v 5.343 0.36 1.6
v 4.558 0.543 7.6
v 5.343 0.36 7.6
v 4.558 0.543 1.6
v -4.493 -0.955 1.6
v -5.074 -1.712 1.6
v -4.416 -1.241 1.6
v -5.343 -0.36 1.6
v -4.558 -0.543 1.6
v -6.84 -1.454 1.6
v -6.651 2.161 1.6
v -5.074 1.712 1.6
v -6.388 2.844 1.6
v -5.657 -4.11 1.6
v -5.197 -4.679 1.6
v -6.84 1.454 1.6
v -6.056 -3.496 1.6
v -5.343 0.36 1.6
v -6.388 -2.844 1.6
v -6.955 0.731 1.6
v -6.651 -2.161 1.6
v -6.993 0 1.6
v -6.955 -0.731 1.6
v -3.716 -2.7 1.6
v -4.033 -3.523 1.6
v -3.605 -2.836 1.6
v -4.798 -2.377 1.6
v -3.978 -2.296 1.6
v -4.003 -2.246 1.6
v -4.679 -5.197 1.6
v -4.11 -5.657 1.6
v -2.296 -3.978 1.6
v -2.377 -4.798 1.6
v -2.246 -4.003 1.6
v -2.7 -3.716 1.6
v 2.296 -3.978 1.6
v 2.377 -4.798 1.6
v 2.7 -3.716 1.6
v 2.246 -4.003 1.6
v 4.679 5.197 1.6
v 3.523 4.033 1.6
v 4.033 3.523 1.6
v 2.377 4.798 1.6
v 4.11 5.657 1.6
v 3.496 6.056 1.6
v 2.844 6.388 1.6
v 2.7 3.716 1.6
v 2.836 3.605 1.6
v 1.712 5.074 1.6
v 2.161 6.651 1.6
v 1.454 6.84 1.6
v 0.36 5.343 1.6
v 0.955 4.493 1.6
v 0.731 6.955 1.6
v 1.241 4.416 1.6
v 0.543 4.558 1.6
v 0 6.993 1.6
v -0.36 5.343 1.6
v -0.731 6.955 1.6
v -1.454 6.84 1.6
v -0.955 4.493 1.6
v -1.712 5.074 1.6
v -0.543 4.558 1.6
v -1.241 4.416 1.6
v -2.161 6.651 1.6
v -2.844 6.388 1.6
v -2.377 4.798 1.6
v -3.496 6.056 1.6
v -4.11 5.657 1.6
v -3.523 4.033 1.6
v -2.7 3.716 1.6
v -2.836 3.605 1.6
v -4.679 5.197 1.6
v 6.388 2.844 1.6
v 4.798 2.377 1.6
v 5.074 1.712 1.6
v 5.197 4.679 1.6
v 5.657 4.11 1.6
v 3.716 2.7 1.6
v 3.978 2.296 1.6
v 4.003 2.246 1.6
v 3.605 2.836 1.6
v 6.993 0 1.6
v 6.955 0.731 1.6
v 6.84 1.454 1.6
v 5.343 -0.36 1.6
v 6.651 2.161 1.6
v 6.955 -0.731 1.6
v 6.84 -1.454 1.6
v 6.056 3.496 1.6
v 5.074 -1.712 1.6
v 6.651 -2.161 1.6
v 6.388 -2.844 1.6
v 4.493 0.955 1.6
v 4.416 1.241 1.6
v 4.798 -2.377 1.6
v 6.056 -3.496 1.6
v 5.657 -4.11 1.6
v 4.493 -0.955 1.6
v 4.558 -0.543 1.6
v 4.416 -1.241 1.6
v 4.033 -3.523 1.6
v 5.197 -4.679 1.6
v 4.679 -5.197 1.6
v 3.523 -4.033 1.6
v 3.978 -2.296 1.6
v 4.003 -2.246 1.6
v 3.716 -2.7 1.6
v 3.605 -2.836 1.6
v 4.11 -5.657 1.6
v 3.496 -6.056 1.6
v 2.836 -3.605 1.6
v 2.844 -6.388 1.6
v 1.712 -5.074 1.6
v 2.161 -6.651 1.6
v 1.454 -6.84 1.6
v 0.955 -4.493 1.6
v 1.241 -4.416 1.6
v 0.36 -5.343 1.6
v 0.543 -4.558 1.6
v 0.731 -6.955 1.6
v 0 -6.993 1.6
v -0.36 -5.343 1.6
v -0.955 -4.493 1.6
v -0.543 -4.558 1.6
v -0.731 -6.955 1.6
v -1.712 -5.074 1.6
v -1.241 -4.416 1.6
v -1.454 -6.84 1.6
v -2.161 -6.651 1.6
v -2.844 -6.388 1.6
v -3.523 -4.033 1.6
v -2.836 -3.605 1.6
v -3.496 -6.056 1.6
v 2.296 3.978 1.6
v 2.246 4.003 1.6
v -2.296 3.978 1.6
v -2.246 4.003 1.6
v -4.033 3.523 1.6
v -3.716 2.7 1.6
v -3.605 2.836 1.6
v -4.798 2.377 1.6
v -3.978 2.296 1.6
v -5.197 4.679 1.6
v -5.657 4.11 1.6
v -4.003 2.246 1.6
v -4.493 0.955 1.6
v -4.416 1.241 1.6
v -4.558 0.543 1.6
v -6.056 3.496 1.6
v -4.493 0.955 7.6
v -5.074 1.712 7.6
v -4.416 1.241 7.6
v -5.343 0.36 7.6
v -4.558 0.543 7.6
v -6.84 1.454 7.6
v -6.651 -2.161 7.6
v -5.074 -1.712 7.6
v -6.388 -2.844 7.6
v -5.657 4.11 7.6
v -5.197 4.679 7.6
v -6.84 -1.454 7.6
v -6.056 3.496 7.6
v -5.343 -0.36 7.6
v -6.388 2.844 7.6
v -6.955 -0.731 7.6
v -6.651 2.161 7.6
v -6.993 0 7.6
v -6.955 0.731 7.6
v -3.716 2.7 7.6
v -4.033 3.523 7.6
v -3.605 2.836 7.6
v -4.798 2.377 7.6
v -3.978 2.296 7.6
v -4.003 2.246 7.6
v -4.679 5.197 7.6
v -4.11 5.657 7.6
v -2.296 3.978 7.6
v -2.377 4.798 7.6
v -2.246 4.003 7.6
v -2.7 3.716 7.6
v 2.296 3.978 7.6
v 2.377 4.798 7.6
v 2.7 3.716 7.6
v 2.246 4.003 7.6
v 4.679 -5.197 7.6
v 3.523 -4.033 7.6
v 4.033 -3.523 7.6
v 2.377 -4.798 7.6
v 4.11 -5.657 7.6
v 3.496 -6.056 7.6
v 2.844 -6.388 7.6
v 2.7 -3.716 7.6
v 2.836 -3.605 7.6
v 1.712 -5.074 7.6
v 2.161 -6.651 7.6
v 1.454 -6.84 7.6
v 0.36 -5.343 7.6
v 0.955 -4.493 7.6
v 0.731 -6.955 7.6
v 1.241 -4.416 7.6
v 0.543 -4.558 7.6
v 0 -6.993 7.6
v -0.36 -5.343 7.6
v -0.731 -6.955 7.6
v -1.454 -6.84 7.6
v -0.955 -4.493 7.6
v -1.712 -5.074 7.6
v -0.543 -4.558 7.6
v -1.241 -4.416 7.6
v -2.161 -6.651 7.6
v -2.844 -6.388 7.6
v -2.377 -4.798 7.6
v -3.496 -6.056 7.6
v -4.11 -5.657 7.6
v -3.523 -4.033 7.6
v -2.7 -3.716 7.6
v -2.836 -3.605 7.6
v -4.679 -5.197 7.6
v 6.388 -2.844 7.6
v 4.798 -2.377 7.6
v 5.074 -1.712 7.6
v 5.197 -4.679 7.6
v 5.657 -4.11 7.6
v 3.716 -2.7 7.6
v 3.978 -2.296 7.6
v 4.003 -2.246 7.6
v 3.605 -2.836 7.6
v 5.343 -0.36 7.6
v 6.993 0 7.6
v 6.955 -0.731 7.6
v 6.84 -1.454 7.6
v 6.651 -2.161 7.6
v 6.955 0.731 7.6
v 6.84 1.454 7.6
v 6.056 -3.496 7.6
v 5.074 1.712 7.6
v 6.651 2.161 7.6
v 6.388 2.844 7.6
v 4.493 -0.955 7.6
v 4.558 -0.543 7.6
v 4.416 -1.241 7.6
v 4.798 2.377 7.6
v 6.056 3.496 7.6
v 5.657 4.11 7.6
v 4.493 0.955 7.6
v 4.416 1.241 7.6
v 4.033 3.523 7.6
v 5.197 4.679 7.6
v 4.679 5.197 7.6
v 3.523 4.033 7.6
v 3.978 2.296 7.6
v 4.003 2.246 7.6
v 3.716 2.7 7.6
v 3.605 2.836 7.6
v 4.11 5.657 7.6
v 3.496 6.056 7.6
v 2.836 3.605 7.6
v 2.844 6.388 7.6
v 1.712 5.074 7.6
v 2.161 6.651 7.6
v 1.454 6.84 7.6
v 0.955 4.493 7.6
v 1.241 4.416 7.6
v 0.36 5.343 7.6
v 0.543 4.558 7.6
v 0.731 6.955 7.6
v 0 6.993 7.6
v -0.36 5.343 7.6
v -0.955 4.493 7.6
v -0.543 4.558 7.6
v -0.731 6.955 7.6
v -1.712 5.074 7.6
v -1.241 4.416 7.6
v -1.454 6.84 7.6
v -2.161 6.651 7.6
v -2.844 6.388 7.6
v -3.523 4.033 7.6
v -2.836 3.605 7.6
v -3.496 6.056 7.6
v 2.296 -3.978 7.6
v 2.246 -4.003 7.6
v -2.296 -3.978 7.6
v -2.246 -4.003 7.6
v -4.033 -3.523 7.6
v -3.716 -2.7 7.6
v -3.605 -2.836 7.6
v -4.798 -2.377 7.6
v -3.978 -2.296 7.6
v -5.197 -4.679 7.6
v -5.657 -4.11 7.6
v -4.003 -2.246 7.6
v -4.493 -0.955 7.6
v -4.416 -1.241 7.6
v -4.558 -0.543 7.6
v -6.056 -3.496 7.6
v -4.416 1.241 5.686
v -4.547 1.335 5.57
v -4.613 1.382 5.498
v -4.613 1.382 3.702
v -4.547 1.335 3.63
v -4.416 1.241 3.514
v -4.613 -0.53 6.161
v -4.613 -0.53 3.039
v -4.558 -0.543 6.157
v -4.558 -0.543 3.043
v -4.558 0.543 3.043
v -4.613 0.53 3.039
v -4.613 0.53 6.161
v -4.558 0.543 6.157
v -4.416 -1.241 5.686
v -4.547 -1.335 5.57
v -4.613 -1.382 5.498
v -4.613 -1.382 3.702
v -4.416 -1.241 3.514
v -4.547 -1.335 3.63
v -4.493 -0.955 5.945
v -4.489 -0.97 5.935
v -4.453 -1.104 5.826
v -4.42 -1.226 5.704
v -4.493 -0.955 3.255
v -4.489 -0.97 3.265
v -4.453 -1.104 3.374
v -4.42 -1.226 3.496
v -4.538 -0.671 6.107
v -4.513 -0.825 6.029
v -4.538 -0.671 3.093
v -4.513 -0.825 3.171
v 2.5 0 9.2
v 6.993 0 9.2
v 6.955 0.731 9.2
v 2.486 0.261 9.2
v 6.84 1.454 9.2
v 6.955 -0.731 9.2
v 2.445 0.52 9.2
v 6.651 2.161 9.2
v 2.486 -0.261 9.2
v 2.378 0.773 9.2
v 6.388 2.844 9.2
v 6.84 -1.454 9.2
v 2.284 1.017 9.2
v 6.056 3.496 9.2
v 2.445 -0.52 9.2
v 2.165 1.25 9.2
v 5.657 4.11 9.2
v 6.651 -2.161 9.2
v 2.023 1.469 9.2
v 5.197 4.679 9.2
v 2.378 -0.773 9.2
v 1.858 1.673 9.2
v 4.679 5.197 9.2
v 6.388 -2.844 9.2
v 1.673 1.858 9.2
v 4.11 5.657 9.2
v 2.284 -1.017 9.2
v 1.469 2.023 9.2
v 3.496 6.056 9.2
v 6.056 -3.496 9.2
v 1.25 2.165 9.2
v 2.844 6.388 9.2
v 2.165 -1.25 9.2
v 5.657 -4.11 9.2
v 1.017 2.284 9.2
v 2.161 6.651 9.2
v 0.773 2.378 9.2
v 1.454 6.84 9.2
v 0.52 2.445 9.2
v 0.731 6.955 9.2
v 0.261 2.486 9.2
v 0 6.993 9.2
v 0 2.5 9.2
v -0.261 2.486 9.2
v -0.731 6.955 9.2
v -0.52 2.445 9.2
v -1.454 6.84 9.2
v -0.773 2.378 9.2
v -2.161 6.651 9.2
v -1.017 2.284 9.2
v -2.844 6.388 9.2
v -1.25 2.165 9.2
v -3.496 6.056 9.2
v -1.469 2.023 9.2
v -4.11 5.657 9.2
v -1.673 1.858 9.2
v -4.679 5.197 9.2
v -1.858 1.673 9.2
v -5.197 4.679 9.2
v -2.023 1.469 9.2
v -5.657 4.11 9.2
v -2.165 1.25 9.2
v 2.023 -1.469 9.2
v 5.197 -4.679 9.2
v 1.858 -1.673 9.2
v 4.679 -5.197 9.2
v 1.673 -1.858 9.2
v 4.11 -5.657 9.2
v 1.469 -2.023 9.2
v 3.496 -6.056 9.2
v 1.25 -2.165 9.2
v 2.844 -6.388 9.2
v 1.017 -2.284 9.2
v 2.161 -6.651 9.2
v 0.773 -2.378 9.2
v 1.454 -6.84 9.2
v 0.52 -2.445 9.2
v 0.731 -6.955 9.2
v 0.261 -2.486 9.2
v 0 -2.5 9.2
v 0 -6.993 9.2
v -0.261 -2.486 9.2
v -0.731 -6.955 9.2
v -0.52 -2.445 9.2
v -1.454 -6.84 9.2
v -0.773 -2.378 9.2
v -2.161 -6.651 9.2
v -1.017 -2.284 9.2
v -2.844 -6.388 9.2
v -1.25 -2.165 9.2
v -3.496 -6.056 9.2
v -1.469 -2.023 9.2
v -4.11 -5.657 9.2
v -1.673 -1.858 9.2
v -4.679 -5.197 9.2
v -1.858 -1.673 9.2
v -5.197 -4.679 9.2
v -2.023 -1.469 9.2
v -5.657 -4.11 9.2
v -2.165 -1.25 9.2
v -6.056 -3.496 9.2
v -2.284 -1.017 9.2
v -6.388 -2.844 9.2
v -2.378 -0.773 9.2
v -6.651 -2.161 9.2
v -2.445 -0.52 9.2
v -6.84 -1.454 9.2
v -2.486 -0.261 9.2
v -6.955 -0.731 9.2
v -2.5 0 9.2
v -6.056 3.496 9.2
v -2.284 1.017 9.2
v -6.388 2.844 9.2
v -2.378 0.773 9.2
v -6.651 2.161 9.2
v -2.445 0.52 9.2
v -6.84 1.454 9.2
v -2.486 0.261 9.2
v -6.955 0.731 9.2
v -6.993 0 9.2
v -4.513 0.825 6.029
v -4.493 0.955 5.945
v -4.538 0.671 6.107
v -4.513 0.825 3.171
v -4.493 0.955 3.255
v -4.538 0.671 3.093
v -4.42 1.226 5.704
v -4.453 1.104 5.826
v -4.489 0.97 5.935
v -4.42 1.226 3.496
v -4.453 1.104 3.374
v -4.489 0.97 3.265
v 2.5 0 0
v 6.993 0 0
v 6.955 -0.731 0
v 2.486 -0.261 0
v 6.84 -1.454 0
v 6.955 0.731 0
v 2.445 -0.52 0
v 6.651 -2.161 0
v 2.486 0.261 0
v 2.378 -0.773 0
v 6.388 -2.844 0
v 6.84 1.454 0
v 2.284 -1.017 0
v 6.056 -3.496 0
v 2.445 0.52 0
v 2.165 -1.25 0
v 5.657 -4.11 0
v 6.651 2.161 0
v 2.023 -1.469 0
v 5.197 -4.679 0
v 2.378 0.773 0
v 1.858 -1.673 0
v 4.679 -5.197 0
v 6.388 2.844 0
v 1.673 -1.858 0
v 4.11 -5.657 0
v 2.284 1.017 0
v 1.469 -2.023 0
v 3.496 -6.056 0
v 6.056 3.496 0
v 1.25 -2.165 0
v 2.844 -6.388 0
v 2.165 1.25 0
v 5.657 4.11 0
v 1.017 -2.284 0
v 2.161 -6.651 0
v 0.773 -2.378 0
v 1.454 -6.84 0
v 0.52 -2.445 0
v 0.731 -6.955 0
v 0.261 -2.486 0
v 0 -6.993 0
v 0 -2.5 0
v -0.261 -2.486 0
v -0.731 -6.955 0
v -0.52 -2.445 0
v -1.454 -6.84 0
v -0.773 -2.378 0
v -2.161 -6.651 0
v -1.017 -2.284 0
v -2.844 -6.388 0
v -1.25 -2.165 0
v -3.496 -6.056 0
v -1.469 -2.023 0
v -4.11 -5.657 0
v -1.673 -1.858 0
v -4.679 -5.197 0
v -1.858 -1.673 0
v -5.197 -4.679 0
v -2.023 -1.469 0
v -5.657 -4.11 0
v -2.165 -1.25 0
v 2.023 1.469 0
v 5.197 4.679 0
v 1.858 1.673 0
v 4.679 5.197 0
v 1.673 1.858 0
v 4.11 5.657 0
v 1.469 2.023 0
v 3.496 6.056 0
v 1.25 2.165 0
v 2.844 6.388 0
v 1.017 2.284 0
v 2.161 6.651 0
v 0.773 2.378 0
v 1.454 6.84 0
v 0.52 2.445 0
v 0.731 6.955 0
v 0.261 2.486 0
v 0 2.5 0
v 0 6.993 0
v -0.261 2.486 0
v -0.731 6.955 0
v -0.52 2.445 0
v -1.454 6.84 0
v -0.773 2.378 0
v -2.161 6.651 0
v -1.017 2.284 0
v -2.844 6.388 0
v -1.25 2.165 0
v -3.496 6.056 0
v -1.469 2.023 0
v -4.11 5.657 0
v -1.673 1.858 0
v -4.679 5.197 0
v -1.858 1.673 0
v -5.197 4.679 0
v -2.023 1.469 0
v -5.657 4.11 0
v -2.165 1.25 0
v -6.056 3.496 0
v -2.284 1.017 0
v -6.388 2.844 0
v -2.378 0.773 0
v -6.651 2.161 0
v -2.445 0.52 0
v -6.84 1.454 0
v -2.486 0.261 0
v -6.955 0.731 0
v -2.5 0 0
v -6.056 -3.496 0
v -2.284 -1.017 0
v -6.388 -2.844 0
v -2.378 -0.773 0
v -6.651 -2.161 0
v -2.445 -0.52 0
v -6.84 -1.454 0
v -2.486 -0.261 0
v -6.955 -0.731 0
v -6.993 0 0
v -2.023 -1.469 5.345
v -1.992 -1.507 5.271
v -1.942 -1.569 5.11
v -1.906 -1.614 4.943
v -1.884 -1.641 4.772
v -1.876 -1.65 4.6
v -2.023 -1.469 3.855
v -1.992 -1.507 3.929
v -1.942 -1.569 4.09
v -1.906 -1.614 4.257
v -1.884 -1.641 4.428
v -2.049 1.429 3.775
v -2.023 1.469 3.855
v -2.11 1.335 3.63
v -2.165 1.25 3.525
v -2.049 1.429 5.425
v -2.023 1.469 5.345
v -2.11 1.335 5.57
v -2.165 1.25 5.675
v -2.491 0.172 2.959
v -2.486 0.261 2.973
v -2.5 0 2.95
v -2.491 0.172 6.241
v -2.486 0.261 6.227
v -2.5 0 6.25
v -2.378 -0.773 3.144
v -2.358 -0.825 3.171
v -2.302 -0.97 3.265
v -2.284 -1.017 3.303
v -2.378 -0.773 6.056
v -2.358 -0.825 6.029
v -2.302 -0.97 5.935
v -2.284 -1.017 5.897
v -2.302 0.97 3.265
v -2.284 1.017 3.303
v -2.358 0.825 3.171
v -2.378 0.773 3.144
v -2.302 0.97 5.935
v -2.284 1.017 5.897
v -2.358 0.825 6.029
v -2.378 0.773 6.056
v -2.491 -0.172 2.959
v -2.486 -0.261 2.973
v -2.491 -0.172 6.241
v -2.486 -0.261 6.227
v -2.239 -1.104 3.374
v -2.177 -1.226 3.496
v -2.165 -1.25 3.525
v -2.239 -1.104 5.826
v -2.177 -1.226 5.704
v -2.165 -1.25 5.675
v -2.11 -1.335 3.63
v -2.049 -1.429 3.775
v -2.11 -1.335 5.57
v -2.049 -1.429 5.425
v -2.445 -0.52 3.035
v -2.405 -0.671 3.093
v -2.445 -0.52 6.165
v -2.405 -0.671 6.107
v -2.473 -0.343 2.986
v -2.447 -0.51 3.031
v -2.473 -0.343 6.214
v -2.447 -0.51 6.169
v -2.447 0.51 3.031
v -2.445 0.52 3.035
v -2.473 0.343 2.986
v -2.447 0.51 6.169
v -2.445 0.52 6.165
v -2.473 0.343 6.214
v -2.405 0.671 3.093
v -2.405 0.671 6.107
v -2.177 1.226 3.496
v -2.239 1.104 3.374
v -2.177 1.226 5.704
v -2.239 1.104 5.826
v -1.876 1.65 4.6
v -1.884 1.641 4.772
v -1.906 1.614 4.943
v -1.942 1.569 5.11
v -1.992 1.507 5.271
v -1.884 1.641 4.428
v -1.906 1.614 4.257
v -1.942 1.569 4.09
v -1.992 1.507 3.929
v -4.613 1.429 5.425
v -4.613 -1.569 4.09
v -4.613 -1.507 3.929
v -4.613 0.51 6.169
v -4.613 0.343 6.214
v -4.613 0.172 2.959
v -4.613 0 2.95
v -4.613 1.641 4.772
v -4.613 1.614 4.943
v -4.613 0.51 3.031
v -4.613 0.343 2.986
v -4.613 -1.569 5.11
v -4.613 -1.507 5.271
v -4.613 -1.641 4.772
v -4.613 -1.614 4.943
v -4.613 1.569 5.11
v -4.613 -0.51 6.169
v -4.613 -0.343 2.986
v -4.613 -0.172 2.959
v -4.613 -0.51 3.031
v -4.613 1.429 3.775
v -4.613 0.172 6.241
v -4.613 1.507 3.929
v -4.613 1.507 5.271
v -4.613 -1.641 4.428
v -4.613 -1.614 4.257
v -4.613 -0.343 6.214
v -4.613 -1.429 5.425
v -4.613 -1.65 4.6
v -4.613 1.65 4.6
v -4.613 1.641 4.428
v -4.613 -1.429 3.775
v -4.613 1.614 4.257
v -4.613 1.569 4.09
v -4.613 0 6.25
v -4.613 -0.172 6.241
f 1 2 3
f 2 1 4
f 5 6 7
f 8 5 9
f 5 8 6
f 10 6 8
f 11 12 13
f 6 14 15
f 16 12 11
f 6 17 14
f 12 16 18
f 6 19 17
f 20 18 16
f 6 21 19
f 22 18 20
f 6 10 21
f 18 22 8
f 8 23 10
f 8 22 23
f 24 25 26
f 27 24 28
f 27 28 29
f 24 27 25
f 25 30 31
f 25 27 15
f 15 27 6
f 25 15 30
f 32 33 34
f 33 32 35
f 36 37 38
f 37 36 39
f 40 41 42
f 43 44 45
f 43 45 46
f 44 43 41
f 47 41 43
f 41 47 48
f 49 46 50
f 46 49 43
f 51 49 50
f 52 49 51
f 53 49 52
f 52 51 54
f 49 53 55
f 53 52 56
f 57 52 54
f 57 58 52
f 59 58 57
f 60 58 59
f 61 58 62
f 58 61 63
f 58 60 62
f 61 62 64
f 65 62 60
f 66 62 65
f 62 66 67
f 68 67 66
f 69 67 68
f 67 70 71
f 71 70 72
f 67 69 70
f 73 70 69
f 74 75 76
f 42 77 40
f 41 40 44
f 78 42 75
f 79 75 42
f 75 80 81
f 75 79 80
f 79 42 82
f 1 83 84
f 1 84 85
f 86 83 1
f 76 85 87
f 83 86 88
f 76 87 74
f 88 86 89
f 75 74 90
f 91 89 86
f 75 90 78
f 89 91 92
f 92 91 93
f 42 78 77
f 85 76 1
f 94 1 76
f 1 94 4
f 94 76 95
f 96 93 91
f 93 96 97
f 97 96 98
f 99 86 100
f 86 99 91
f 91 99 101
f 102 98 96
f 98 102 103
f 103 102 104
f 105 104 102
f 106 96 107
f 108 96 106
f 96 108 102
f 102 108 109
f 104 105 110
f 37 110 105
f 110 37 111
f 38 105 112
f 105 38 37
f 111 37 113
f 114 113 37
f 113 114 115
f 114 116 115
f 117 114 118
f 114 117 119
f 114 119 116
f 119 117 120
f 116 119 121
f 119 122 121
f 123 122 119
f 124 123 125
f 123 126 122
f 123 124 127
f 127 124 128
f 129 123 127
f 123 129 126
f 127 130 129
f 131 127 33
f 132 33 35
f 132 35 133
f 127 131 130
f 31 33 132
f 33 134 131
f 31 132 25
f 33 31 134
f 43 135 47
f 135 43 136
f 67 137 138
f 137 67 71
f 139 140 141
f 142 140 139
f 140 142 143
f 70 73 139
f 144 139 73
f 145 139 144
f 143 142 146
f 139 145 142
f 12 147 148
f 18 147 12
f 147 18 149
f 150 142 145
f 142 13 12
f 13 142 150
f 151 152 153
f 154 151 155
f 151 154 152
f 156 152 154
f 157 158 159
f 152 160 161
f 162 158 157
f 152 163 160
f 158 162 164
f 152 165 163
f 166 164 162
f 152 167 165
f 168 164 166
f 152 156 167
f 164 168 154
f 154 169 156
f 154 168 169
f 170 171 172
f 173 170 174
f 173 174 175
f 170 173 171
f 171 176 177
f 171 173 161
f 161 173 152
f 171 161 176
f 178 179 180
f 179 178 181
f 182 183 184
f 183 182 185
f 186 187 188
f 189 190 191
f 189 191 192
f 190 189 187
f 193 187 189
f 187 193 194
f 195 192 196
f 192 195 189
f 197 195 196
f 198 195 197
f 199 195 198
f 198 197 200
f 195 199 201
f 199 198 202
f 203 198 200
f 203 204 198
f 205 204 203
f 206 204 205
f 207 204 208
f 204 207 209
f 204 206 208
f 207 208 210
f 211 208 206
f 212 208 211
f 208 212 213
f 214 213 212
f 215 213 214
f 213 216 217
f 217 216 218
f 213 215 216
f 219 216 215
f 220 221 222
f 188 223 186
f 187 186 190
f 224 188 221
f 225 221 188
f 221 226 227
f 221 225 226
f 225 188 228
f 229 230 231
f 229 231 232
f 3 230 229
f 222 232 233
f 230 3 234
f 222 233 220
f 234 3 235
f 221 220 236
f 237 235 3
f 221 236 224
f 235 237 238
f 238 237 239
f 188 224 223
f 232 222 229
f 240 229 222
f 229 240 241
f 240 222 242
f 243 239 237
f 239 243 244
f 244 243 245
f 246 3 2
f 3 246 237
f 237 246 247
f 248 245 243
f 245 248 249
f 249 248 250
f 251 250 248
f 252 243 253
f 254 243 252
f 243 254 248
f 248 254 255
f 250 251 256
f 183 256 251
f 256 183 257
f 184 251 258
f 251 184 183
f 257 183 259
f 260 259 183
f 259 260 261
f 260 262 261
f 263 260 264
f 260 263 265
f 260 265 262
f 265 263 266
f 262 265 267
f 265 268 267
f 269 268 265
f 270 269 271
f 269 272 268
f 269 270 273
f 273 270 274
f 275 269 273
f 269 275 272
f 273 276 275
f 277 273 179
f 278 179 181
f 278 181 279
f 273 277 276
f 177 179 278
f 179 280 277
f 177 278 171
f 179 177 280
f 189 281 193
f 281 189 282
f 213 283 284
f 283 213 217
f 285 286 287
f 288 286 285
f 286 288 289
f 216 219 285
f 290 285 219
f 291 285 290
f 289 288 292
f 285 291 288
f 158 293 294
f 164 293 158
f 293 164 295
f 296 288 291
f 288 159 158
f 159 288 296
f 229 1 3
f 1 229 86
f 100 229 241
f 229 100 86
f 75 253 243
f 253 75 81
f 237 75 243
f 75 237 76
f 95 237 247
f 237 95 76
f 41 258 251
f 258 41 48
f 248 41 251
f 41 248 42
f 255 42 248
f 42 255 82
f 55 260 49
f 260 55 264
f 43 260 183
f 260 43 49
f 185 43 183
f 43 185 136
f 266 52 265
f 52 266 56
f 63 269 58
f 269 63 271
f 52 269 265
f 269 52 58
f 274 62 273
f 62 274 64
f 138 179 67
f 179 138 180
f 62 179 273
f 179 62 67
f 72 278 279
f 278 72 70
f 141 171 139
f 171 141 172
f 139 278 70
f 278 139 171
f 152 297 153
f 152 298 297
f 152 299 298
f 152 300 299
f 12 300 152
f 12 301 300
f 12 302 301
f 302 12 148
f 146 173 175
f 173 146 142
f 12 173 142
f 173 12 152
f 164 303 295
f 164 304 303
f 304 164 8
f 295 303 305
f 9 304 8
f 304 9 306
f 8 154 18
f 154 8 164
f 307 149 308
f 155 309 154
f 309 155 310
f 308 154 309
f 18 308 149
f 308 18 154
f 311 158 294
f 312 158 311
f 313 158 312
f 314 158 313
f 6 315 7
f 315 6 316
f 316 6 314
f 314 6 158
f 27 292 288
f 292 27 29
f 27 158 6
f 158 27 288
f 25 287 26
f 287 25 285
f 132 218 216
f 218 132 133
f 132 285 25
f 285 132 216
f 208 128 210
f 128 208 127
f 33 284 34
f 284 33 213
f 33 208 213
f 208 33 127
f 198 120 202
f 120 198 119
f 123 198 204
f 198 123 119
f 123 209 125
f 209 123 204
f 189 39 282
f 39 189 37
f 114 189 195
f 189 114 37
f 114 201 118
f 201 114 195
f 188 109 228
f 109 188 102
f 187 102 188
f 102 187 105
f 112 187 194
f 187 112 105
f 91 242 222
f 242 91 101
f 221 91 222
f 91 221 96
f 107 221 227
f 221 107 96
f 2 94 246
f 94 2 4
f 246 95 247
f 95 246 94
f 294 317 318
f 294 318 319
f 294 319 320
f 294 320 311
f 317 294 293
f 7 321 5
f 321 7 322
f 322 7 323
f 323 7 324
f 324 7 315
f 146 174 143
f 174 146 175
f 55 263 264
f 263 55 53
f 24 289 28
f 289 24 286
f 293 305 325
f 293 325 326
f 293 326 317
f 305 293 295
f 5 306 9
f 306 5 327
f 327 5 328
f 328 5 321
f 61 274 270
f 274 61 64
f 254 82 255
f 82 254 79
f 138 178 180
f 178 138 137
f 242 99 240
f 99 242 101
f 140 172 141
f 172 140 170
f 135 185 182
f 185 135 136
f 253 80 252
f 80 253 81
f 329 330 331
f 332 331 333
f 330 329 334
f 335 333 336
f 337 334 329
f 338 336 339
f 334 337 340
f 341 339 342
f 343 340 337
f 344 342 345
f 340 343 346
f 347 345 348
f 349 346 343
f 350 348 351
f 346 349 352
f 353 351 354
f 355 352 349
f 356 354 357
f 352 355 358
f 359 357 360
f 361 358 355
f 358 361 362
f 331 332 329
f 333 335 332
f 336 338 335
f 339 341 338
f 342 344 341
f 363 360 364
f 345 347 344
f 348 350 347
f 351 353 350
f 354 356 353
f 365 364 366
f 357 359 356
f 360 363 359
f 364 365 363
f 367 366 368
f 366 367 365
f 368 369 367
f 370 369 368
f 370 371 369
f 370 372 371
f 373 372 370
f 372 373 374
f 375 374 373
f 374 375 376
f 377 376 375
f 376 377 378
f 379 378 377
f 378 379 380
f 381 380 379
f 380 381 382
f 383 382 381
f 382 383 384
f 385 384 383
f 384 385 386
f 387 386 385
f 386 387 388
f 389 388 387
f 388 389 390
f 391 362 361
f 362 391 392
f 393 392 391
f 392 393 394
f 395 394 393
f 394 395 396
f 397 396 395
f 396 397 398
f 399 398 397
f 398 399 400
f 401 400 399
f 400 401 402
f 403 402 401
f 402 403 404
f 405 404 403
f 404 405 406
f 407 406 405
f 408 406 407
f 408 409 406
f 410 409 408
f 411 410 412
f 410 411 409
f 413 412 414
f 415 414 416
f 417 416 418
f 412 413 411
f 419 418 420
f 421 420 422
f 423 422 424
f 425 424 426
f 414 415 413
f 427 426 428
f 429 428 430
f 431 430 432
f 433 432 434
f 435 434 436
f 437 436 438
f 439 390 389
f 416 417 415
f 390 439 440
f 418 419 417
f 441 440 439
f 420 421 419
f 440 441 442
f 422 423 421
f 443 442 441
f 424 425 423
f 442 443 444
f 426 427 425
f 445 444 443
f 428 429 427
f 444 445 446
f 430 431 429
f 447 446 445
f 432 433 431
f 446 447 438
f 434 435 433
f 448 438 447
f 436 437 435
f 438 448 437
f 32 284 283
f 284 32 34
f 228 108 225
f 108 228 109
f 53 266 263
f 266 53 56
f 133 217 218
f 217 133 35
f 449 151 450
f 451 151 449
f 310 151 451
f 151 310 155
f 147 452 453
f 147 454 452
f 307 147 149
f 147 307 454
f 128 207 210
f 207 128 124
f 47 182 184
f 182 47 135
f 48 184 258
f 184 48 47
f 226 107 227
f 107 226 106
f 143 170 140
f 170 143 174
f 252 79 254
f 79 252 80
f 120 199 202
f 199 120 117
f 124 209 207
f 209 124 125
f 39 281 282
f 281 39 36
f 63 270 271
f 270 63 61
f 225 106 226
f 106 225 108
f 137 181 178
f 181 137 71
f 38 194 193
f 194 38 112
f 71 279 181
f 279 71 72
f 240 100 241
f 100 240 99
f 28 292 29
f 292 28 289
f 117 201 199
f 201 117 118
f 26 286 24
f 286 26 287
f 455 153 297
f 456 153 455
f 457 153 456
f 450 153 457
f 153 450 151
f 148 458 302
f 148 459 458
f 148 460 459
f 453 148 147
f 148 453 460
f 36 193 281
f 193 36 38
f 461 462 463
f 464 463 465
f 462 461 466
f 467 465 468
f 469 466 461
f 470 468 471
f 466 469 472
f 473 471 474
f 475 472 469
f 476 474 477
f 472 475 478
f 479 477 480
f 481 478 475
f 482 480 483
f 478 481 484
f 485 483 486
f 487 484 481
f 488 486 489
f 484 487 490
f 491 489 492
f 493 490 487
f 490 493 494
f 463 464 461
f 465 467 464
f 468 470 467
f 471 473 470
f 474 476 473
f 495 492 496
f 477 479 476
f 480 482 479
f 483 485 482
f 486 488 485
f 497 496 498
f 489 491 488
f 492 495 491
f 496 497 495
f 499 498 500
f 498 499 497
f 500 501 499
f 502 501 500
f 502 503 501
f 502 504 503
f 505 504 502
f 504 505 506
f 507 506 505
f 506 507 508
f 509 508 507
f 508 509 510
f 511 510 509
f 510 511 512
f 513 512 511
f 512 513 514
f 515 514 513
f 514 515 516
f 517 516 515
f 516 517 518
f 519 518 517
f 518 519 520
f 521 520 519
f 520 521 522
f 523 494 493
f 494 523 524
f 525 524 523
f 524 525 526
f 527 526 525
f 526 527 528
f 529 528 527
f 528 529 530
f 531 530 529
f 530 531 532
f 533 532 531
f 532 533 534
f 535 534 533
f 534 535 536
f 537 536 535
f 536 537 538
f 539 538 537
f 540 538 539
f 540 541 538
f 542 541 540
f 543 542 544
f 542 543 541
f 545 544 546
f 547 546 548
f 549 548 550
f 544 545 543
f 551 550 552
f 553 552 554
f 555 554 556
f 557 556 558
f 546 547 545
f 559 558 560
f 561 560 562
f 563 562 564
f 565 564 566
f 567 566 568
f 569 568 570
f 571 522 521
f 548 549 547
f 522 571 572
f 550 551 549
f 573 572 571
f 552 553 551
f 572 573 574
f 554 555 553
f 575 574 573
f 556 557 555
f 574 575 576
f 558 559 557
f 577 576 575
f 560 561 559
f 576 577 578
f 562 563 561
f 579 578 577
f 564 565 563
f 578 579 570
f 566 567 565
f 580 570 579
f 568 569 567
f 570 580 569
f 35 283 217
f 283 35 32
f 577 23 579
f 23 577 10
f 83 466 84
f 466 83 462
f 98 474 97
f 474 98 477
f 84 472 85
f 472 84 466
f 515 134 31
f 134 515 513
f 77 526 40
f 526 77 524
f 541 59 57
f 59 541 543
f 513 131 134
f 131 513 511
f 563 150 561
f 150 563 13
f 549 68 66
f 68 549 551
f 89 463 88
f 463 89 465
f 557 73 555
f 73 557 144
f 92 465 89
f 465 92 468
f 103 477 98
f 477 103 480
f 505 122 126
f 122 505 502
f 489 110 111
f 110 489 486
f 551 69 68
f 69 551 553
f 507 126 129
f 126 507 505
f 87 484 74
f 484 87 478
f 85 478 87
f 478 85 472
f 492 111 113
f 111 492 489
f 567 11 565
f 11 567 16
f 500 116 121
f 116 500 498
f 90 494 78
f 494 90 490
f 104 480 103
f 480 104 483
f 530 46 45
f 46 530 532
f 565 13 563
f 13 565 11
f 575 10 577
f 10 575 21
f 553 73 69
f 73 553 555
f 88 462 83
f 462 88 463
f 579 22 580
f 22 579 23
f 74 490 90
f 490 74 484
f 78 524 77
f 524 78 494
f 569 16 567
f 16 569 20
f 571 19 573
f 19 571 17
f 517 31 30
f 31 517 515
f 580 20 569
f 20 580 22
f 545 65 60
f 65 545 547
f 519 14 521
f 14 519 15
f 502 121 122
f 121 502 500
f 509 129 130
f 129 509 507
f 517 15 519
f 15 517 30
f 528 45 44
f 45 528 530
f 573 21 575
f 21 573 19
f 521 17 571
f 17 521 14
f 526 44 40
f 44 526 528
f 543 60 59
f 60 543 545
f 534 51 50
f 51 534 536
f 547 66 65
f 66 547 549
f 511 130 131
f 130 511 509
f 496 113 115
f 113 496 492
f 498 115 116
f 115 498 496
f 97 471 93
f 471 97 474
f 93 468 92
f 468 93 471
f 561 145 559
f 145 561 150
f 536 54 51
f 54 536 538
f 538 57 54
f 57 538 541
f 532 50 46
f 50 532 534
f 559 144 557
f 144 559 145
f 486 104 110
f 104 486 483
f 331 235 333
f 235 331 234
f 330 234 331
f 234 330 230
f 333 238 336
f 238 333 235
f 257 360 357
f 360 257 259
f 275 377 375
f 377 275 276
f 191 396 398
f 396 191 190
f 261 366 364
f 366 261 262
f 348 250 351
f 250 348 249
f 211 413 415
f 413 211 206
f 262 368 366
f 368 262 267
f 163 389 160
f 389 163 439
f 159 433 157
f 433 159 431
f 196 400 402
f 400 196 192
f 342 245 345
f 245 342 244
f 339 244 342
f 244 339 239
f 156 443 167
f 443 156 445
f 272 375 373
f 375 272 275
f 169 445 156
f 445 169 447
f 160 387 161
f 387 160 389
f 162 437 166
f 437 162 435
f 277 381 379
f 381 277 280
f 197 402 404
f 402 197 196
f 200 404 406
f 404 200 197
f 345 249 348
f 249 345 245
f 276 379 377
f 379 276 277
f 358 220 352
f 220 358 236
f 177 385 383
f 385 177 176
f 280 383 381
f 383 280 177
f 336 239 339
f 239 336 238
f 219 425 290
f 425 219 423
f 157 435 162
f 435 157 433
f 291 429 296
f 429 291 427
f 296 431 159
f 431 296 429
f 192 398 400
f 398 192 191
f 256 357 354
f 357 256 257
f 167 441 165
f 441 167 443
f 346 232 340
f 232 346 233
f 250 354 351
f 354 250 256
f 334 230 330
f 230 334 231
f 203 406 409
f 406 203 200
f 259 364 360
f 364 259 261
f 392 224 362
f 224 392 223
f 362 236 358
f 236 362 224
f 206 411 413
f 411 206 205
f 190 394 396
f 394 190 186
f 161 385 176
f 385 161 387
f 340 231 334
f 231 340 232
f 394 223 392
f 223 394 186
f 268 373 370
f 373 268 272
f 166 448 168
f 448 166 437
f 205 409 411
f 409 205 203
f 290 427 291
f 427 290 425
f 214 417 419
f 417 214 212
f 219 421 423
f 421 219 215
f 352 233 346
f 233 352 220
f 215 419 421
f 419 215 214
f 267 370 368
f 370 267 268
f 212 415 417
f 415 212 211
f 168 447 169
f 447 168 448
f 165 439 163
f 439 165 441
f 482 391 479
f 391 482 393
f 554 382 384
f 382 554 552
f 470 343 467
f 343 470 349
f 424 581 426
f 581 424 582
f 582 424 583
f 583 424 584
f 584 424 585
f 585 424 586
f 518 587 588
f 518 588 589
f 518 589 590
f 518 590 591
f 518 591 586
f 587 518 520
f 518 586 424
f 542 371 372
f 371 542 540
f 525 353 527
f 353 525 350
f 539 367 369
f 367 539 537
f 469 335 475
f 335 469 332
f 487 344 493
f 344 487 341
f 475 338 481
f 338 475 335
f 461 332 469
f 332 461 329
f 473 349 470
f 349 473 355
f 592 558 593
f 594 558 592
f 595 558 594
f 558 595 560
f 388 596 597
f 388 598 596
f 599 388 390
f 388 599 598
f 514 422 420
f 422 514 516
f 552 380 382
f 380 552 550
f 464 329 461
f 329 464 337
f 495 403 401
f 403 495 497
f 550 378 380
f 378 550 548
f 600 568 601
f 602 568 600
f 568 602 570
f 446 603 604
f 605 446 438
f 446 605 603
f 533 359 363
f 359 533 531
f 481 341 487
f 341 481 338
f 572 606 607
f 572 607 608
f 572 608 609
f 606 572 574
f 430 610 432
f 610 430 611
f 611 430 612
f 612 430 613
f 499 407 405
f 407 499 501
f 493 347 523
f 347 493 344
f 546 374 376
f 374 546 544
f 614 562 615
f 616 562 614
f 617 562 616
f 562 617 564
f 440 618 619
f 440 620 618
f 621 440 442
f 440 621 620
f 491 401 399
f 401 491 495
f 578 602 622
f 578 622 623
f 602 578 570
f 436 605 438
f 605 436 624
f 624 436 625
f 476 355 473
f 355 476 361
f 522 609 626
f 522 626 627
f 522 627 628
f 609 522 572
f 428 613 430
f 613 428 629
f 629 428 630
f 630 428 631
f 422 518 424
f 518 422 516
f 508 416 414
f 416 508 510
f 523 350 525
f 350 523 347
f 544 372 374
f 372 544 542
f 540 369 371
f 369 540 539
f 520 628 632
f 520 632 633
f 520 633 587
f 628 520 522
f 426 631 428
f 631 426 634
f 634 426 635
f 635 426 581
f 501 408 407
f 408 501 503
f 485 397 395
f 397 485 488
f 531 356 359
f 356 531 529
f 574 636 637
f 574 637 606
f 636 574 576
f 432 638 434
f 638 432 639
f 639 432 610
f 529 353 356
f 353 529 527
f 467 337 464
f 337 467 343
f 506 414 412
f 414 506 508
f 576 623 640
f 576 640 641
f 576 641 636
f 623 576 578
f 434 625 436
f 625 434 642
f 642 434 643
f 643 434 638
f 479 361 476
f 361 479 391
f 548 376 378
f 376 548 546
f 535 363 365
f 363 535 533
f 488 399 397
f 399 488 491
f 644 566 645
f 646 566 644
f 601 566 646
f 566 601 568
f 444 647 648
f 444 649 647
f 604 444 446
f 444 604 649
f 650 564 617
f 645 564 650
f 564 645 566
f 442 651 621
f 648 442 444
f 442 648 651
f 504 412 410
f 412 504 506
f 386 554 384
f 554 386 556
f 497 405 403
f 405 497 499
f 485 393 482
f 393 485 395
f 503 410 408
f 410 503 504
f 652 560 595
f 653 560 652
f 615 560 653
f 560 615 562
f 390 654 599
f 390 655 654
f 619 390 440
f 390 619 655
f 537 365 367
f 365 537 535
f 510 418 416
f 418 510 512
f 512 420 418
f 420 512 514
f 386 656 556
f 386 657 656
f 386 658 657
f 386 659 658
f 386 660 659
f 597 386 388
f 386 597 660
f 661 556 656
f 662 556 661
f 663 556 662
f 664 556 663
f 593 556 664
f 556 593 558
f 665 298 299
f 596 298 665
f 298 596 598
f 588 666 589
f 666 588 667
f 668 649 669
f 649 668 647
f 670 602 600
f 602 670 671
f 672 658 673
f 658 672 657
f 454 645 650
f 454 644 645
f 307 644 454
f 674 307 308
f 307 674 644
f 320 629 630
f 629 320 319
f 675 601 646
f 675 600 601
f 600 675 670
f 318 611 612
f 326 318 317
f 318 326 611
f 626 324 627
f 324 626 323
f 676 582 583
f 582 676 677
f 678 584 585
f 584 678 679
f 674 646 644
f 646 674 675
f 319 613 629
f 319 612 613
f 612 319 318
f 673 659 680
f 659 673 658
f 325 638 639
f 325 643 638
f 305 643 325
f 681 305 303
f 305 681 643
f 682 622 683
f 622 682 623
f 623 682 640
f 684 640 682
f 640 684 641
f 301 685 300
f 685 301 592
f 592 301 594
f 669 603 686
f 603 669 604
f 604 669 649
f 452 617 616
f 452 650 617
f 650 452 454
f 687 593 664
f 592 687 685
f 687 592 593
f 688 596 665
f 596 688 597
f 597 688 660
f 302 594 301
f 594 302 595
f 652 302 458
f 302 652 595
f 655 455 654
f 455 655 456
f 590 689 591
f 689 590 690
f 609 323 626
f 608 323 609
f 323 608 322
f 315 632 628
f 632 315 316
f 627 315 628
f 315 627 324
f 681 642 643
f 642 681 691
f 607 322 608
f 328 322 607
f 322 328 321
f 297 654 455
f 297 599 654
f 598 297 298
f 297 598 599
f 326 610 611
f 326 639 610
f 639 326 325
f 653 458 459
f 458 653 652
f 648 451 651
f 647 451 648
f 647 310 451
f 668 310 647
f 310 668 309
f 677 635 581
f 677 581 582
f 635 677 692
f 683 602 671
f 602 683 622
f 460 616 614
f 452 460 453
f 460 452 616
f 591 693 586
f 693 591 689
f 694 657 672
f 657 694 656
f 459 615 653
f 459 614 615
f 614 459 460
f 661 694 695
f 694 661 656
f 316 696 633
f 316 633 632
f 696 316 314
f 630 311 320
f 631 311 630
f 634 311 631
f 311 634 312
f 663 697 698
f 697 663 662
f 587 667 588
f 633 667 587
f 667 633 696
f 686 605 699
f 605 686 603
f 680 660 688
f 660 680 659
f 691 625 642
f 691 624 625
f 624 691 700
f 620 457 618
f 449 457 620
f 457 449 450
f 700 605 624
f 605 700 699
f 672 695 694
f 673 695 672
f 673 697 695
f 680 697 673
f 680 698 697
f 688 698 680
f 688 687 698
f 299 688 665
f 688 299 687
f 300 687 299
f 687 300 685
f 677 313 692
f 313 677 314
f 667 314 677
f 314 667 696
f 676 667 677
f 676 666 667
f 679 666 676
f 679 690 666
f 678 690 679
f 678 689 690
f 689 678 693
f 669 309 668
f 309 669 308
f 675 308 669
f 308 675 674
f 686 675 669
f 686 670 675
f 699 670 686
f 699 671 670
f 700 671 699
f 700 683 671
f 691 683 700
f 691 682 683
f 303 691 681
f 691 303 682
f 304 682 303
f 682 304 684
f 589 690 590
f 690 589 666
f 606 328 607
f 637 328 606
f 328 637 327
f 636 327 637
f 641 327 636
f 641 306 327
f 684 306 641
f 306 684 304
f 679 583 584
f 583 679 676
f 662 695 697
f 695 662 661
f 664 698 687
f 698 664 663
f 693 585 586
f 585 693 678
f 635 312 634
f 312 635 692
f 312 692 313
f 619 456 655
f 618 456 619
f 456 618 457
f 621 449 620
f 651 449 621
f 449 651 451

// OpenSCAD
// GT2 pulley 16T / 6 mm belt
// Parametric GT2 pulley. Tooth blocks overlap the core by tooth_overlap to form one solid.
$fn = 60;
eps = 0.02;
min_wall = 1.5;
teeth = 16;
belt_pitch = 2;
belt_width = 6;
shaft_d = 5;
set_screw_d = 3.3;
tooth_depth = 0.75;
tooth_overlap = 0.28;
tooth_base_width = 1.20;
tooth_tip_width = 0.72;
flange_t = 1.6;
flange_overhang = 2.4;
core_d = teeth * belt_pitch / PI - 1.0;
body_h = belt_width + 2 * flange_t;

module gt2_tooth() {
    linear_extrude(height = belt_width)
        polygon(points = [
            [-tooth_overlap, -tooth_base_width / 2],
            [tooth_depth, -tooth_tip_width / 2],
            [tooth_depth, tooth_tip_width / 2],
            [-tooth_overlap, tooth_base_width / 2]
        ]);
}

difference() {
    union() {
        cylinder(d = core_d, h = body_h);
        cylinder(d = core_d + 2 * flange_overhang, h = flange_t);
        translate([0, 0, body_h - flange_t])
            cylinder(d = core_d + 2 * flange_overhang, h = flange_t);
        for (i = [0 : teeth - 1])
            rotate([0, 0, i * 360 / teeth])
                translate([core_d / 2, 0, flange_t]) gt2_tooth();
    }
    translate([0, 0, -eps]) cylinder(d = shaft_d, h = body_h + 2 * eps);
    translate([-core_d / 2 - eps, 0, body_h / 2])
        rotate([0, 90, 0]) cylinder(d = set_screw_d, h = core_d / 2 + 2 * eps);
}
